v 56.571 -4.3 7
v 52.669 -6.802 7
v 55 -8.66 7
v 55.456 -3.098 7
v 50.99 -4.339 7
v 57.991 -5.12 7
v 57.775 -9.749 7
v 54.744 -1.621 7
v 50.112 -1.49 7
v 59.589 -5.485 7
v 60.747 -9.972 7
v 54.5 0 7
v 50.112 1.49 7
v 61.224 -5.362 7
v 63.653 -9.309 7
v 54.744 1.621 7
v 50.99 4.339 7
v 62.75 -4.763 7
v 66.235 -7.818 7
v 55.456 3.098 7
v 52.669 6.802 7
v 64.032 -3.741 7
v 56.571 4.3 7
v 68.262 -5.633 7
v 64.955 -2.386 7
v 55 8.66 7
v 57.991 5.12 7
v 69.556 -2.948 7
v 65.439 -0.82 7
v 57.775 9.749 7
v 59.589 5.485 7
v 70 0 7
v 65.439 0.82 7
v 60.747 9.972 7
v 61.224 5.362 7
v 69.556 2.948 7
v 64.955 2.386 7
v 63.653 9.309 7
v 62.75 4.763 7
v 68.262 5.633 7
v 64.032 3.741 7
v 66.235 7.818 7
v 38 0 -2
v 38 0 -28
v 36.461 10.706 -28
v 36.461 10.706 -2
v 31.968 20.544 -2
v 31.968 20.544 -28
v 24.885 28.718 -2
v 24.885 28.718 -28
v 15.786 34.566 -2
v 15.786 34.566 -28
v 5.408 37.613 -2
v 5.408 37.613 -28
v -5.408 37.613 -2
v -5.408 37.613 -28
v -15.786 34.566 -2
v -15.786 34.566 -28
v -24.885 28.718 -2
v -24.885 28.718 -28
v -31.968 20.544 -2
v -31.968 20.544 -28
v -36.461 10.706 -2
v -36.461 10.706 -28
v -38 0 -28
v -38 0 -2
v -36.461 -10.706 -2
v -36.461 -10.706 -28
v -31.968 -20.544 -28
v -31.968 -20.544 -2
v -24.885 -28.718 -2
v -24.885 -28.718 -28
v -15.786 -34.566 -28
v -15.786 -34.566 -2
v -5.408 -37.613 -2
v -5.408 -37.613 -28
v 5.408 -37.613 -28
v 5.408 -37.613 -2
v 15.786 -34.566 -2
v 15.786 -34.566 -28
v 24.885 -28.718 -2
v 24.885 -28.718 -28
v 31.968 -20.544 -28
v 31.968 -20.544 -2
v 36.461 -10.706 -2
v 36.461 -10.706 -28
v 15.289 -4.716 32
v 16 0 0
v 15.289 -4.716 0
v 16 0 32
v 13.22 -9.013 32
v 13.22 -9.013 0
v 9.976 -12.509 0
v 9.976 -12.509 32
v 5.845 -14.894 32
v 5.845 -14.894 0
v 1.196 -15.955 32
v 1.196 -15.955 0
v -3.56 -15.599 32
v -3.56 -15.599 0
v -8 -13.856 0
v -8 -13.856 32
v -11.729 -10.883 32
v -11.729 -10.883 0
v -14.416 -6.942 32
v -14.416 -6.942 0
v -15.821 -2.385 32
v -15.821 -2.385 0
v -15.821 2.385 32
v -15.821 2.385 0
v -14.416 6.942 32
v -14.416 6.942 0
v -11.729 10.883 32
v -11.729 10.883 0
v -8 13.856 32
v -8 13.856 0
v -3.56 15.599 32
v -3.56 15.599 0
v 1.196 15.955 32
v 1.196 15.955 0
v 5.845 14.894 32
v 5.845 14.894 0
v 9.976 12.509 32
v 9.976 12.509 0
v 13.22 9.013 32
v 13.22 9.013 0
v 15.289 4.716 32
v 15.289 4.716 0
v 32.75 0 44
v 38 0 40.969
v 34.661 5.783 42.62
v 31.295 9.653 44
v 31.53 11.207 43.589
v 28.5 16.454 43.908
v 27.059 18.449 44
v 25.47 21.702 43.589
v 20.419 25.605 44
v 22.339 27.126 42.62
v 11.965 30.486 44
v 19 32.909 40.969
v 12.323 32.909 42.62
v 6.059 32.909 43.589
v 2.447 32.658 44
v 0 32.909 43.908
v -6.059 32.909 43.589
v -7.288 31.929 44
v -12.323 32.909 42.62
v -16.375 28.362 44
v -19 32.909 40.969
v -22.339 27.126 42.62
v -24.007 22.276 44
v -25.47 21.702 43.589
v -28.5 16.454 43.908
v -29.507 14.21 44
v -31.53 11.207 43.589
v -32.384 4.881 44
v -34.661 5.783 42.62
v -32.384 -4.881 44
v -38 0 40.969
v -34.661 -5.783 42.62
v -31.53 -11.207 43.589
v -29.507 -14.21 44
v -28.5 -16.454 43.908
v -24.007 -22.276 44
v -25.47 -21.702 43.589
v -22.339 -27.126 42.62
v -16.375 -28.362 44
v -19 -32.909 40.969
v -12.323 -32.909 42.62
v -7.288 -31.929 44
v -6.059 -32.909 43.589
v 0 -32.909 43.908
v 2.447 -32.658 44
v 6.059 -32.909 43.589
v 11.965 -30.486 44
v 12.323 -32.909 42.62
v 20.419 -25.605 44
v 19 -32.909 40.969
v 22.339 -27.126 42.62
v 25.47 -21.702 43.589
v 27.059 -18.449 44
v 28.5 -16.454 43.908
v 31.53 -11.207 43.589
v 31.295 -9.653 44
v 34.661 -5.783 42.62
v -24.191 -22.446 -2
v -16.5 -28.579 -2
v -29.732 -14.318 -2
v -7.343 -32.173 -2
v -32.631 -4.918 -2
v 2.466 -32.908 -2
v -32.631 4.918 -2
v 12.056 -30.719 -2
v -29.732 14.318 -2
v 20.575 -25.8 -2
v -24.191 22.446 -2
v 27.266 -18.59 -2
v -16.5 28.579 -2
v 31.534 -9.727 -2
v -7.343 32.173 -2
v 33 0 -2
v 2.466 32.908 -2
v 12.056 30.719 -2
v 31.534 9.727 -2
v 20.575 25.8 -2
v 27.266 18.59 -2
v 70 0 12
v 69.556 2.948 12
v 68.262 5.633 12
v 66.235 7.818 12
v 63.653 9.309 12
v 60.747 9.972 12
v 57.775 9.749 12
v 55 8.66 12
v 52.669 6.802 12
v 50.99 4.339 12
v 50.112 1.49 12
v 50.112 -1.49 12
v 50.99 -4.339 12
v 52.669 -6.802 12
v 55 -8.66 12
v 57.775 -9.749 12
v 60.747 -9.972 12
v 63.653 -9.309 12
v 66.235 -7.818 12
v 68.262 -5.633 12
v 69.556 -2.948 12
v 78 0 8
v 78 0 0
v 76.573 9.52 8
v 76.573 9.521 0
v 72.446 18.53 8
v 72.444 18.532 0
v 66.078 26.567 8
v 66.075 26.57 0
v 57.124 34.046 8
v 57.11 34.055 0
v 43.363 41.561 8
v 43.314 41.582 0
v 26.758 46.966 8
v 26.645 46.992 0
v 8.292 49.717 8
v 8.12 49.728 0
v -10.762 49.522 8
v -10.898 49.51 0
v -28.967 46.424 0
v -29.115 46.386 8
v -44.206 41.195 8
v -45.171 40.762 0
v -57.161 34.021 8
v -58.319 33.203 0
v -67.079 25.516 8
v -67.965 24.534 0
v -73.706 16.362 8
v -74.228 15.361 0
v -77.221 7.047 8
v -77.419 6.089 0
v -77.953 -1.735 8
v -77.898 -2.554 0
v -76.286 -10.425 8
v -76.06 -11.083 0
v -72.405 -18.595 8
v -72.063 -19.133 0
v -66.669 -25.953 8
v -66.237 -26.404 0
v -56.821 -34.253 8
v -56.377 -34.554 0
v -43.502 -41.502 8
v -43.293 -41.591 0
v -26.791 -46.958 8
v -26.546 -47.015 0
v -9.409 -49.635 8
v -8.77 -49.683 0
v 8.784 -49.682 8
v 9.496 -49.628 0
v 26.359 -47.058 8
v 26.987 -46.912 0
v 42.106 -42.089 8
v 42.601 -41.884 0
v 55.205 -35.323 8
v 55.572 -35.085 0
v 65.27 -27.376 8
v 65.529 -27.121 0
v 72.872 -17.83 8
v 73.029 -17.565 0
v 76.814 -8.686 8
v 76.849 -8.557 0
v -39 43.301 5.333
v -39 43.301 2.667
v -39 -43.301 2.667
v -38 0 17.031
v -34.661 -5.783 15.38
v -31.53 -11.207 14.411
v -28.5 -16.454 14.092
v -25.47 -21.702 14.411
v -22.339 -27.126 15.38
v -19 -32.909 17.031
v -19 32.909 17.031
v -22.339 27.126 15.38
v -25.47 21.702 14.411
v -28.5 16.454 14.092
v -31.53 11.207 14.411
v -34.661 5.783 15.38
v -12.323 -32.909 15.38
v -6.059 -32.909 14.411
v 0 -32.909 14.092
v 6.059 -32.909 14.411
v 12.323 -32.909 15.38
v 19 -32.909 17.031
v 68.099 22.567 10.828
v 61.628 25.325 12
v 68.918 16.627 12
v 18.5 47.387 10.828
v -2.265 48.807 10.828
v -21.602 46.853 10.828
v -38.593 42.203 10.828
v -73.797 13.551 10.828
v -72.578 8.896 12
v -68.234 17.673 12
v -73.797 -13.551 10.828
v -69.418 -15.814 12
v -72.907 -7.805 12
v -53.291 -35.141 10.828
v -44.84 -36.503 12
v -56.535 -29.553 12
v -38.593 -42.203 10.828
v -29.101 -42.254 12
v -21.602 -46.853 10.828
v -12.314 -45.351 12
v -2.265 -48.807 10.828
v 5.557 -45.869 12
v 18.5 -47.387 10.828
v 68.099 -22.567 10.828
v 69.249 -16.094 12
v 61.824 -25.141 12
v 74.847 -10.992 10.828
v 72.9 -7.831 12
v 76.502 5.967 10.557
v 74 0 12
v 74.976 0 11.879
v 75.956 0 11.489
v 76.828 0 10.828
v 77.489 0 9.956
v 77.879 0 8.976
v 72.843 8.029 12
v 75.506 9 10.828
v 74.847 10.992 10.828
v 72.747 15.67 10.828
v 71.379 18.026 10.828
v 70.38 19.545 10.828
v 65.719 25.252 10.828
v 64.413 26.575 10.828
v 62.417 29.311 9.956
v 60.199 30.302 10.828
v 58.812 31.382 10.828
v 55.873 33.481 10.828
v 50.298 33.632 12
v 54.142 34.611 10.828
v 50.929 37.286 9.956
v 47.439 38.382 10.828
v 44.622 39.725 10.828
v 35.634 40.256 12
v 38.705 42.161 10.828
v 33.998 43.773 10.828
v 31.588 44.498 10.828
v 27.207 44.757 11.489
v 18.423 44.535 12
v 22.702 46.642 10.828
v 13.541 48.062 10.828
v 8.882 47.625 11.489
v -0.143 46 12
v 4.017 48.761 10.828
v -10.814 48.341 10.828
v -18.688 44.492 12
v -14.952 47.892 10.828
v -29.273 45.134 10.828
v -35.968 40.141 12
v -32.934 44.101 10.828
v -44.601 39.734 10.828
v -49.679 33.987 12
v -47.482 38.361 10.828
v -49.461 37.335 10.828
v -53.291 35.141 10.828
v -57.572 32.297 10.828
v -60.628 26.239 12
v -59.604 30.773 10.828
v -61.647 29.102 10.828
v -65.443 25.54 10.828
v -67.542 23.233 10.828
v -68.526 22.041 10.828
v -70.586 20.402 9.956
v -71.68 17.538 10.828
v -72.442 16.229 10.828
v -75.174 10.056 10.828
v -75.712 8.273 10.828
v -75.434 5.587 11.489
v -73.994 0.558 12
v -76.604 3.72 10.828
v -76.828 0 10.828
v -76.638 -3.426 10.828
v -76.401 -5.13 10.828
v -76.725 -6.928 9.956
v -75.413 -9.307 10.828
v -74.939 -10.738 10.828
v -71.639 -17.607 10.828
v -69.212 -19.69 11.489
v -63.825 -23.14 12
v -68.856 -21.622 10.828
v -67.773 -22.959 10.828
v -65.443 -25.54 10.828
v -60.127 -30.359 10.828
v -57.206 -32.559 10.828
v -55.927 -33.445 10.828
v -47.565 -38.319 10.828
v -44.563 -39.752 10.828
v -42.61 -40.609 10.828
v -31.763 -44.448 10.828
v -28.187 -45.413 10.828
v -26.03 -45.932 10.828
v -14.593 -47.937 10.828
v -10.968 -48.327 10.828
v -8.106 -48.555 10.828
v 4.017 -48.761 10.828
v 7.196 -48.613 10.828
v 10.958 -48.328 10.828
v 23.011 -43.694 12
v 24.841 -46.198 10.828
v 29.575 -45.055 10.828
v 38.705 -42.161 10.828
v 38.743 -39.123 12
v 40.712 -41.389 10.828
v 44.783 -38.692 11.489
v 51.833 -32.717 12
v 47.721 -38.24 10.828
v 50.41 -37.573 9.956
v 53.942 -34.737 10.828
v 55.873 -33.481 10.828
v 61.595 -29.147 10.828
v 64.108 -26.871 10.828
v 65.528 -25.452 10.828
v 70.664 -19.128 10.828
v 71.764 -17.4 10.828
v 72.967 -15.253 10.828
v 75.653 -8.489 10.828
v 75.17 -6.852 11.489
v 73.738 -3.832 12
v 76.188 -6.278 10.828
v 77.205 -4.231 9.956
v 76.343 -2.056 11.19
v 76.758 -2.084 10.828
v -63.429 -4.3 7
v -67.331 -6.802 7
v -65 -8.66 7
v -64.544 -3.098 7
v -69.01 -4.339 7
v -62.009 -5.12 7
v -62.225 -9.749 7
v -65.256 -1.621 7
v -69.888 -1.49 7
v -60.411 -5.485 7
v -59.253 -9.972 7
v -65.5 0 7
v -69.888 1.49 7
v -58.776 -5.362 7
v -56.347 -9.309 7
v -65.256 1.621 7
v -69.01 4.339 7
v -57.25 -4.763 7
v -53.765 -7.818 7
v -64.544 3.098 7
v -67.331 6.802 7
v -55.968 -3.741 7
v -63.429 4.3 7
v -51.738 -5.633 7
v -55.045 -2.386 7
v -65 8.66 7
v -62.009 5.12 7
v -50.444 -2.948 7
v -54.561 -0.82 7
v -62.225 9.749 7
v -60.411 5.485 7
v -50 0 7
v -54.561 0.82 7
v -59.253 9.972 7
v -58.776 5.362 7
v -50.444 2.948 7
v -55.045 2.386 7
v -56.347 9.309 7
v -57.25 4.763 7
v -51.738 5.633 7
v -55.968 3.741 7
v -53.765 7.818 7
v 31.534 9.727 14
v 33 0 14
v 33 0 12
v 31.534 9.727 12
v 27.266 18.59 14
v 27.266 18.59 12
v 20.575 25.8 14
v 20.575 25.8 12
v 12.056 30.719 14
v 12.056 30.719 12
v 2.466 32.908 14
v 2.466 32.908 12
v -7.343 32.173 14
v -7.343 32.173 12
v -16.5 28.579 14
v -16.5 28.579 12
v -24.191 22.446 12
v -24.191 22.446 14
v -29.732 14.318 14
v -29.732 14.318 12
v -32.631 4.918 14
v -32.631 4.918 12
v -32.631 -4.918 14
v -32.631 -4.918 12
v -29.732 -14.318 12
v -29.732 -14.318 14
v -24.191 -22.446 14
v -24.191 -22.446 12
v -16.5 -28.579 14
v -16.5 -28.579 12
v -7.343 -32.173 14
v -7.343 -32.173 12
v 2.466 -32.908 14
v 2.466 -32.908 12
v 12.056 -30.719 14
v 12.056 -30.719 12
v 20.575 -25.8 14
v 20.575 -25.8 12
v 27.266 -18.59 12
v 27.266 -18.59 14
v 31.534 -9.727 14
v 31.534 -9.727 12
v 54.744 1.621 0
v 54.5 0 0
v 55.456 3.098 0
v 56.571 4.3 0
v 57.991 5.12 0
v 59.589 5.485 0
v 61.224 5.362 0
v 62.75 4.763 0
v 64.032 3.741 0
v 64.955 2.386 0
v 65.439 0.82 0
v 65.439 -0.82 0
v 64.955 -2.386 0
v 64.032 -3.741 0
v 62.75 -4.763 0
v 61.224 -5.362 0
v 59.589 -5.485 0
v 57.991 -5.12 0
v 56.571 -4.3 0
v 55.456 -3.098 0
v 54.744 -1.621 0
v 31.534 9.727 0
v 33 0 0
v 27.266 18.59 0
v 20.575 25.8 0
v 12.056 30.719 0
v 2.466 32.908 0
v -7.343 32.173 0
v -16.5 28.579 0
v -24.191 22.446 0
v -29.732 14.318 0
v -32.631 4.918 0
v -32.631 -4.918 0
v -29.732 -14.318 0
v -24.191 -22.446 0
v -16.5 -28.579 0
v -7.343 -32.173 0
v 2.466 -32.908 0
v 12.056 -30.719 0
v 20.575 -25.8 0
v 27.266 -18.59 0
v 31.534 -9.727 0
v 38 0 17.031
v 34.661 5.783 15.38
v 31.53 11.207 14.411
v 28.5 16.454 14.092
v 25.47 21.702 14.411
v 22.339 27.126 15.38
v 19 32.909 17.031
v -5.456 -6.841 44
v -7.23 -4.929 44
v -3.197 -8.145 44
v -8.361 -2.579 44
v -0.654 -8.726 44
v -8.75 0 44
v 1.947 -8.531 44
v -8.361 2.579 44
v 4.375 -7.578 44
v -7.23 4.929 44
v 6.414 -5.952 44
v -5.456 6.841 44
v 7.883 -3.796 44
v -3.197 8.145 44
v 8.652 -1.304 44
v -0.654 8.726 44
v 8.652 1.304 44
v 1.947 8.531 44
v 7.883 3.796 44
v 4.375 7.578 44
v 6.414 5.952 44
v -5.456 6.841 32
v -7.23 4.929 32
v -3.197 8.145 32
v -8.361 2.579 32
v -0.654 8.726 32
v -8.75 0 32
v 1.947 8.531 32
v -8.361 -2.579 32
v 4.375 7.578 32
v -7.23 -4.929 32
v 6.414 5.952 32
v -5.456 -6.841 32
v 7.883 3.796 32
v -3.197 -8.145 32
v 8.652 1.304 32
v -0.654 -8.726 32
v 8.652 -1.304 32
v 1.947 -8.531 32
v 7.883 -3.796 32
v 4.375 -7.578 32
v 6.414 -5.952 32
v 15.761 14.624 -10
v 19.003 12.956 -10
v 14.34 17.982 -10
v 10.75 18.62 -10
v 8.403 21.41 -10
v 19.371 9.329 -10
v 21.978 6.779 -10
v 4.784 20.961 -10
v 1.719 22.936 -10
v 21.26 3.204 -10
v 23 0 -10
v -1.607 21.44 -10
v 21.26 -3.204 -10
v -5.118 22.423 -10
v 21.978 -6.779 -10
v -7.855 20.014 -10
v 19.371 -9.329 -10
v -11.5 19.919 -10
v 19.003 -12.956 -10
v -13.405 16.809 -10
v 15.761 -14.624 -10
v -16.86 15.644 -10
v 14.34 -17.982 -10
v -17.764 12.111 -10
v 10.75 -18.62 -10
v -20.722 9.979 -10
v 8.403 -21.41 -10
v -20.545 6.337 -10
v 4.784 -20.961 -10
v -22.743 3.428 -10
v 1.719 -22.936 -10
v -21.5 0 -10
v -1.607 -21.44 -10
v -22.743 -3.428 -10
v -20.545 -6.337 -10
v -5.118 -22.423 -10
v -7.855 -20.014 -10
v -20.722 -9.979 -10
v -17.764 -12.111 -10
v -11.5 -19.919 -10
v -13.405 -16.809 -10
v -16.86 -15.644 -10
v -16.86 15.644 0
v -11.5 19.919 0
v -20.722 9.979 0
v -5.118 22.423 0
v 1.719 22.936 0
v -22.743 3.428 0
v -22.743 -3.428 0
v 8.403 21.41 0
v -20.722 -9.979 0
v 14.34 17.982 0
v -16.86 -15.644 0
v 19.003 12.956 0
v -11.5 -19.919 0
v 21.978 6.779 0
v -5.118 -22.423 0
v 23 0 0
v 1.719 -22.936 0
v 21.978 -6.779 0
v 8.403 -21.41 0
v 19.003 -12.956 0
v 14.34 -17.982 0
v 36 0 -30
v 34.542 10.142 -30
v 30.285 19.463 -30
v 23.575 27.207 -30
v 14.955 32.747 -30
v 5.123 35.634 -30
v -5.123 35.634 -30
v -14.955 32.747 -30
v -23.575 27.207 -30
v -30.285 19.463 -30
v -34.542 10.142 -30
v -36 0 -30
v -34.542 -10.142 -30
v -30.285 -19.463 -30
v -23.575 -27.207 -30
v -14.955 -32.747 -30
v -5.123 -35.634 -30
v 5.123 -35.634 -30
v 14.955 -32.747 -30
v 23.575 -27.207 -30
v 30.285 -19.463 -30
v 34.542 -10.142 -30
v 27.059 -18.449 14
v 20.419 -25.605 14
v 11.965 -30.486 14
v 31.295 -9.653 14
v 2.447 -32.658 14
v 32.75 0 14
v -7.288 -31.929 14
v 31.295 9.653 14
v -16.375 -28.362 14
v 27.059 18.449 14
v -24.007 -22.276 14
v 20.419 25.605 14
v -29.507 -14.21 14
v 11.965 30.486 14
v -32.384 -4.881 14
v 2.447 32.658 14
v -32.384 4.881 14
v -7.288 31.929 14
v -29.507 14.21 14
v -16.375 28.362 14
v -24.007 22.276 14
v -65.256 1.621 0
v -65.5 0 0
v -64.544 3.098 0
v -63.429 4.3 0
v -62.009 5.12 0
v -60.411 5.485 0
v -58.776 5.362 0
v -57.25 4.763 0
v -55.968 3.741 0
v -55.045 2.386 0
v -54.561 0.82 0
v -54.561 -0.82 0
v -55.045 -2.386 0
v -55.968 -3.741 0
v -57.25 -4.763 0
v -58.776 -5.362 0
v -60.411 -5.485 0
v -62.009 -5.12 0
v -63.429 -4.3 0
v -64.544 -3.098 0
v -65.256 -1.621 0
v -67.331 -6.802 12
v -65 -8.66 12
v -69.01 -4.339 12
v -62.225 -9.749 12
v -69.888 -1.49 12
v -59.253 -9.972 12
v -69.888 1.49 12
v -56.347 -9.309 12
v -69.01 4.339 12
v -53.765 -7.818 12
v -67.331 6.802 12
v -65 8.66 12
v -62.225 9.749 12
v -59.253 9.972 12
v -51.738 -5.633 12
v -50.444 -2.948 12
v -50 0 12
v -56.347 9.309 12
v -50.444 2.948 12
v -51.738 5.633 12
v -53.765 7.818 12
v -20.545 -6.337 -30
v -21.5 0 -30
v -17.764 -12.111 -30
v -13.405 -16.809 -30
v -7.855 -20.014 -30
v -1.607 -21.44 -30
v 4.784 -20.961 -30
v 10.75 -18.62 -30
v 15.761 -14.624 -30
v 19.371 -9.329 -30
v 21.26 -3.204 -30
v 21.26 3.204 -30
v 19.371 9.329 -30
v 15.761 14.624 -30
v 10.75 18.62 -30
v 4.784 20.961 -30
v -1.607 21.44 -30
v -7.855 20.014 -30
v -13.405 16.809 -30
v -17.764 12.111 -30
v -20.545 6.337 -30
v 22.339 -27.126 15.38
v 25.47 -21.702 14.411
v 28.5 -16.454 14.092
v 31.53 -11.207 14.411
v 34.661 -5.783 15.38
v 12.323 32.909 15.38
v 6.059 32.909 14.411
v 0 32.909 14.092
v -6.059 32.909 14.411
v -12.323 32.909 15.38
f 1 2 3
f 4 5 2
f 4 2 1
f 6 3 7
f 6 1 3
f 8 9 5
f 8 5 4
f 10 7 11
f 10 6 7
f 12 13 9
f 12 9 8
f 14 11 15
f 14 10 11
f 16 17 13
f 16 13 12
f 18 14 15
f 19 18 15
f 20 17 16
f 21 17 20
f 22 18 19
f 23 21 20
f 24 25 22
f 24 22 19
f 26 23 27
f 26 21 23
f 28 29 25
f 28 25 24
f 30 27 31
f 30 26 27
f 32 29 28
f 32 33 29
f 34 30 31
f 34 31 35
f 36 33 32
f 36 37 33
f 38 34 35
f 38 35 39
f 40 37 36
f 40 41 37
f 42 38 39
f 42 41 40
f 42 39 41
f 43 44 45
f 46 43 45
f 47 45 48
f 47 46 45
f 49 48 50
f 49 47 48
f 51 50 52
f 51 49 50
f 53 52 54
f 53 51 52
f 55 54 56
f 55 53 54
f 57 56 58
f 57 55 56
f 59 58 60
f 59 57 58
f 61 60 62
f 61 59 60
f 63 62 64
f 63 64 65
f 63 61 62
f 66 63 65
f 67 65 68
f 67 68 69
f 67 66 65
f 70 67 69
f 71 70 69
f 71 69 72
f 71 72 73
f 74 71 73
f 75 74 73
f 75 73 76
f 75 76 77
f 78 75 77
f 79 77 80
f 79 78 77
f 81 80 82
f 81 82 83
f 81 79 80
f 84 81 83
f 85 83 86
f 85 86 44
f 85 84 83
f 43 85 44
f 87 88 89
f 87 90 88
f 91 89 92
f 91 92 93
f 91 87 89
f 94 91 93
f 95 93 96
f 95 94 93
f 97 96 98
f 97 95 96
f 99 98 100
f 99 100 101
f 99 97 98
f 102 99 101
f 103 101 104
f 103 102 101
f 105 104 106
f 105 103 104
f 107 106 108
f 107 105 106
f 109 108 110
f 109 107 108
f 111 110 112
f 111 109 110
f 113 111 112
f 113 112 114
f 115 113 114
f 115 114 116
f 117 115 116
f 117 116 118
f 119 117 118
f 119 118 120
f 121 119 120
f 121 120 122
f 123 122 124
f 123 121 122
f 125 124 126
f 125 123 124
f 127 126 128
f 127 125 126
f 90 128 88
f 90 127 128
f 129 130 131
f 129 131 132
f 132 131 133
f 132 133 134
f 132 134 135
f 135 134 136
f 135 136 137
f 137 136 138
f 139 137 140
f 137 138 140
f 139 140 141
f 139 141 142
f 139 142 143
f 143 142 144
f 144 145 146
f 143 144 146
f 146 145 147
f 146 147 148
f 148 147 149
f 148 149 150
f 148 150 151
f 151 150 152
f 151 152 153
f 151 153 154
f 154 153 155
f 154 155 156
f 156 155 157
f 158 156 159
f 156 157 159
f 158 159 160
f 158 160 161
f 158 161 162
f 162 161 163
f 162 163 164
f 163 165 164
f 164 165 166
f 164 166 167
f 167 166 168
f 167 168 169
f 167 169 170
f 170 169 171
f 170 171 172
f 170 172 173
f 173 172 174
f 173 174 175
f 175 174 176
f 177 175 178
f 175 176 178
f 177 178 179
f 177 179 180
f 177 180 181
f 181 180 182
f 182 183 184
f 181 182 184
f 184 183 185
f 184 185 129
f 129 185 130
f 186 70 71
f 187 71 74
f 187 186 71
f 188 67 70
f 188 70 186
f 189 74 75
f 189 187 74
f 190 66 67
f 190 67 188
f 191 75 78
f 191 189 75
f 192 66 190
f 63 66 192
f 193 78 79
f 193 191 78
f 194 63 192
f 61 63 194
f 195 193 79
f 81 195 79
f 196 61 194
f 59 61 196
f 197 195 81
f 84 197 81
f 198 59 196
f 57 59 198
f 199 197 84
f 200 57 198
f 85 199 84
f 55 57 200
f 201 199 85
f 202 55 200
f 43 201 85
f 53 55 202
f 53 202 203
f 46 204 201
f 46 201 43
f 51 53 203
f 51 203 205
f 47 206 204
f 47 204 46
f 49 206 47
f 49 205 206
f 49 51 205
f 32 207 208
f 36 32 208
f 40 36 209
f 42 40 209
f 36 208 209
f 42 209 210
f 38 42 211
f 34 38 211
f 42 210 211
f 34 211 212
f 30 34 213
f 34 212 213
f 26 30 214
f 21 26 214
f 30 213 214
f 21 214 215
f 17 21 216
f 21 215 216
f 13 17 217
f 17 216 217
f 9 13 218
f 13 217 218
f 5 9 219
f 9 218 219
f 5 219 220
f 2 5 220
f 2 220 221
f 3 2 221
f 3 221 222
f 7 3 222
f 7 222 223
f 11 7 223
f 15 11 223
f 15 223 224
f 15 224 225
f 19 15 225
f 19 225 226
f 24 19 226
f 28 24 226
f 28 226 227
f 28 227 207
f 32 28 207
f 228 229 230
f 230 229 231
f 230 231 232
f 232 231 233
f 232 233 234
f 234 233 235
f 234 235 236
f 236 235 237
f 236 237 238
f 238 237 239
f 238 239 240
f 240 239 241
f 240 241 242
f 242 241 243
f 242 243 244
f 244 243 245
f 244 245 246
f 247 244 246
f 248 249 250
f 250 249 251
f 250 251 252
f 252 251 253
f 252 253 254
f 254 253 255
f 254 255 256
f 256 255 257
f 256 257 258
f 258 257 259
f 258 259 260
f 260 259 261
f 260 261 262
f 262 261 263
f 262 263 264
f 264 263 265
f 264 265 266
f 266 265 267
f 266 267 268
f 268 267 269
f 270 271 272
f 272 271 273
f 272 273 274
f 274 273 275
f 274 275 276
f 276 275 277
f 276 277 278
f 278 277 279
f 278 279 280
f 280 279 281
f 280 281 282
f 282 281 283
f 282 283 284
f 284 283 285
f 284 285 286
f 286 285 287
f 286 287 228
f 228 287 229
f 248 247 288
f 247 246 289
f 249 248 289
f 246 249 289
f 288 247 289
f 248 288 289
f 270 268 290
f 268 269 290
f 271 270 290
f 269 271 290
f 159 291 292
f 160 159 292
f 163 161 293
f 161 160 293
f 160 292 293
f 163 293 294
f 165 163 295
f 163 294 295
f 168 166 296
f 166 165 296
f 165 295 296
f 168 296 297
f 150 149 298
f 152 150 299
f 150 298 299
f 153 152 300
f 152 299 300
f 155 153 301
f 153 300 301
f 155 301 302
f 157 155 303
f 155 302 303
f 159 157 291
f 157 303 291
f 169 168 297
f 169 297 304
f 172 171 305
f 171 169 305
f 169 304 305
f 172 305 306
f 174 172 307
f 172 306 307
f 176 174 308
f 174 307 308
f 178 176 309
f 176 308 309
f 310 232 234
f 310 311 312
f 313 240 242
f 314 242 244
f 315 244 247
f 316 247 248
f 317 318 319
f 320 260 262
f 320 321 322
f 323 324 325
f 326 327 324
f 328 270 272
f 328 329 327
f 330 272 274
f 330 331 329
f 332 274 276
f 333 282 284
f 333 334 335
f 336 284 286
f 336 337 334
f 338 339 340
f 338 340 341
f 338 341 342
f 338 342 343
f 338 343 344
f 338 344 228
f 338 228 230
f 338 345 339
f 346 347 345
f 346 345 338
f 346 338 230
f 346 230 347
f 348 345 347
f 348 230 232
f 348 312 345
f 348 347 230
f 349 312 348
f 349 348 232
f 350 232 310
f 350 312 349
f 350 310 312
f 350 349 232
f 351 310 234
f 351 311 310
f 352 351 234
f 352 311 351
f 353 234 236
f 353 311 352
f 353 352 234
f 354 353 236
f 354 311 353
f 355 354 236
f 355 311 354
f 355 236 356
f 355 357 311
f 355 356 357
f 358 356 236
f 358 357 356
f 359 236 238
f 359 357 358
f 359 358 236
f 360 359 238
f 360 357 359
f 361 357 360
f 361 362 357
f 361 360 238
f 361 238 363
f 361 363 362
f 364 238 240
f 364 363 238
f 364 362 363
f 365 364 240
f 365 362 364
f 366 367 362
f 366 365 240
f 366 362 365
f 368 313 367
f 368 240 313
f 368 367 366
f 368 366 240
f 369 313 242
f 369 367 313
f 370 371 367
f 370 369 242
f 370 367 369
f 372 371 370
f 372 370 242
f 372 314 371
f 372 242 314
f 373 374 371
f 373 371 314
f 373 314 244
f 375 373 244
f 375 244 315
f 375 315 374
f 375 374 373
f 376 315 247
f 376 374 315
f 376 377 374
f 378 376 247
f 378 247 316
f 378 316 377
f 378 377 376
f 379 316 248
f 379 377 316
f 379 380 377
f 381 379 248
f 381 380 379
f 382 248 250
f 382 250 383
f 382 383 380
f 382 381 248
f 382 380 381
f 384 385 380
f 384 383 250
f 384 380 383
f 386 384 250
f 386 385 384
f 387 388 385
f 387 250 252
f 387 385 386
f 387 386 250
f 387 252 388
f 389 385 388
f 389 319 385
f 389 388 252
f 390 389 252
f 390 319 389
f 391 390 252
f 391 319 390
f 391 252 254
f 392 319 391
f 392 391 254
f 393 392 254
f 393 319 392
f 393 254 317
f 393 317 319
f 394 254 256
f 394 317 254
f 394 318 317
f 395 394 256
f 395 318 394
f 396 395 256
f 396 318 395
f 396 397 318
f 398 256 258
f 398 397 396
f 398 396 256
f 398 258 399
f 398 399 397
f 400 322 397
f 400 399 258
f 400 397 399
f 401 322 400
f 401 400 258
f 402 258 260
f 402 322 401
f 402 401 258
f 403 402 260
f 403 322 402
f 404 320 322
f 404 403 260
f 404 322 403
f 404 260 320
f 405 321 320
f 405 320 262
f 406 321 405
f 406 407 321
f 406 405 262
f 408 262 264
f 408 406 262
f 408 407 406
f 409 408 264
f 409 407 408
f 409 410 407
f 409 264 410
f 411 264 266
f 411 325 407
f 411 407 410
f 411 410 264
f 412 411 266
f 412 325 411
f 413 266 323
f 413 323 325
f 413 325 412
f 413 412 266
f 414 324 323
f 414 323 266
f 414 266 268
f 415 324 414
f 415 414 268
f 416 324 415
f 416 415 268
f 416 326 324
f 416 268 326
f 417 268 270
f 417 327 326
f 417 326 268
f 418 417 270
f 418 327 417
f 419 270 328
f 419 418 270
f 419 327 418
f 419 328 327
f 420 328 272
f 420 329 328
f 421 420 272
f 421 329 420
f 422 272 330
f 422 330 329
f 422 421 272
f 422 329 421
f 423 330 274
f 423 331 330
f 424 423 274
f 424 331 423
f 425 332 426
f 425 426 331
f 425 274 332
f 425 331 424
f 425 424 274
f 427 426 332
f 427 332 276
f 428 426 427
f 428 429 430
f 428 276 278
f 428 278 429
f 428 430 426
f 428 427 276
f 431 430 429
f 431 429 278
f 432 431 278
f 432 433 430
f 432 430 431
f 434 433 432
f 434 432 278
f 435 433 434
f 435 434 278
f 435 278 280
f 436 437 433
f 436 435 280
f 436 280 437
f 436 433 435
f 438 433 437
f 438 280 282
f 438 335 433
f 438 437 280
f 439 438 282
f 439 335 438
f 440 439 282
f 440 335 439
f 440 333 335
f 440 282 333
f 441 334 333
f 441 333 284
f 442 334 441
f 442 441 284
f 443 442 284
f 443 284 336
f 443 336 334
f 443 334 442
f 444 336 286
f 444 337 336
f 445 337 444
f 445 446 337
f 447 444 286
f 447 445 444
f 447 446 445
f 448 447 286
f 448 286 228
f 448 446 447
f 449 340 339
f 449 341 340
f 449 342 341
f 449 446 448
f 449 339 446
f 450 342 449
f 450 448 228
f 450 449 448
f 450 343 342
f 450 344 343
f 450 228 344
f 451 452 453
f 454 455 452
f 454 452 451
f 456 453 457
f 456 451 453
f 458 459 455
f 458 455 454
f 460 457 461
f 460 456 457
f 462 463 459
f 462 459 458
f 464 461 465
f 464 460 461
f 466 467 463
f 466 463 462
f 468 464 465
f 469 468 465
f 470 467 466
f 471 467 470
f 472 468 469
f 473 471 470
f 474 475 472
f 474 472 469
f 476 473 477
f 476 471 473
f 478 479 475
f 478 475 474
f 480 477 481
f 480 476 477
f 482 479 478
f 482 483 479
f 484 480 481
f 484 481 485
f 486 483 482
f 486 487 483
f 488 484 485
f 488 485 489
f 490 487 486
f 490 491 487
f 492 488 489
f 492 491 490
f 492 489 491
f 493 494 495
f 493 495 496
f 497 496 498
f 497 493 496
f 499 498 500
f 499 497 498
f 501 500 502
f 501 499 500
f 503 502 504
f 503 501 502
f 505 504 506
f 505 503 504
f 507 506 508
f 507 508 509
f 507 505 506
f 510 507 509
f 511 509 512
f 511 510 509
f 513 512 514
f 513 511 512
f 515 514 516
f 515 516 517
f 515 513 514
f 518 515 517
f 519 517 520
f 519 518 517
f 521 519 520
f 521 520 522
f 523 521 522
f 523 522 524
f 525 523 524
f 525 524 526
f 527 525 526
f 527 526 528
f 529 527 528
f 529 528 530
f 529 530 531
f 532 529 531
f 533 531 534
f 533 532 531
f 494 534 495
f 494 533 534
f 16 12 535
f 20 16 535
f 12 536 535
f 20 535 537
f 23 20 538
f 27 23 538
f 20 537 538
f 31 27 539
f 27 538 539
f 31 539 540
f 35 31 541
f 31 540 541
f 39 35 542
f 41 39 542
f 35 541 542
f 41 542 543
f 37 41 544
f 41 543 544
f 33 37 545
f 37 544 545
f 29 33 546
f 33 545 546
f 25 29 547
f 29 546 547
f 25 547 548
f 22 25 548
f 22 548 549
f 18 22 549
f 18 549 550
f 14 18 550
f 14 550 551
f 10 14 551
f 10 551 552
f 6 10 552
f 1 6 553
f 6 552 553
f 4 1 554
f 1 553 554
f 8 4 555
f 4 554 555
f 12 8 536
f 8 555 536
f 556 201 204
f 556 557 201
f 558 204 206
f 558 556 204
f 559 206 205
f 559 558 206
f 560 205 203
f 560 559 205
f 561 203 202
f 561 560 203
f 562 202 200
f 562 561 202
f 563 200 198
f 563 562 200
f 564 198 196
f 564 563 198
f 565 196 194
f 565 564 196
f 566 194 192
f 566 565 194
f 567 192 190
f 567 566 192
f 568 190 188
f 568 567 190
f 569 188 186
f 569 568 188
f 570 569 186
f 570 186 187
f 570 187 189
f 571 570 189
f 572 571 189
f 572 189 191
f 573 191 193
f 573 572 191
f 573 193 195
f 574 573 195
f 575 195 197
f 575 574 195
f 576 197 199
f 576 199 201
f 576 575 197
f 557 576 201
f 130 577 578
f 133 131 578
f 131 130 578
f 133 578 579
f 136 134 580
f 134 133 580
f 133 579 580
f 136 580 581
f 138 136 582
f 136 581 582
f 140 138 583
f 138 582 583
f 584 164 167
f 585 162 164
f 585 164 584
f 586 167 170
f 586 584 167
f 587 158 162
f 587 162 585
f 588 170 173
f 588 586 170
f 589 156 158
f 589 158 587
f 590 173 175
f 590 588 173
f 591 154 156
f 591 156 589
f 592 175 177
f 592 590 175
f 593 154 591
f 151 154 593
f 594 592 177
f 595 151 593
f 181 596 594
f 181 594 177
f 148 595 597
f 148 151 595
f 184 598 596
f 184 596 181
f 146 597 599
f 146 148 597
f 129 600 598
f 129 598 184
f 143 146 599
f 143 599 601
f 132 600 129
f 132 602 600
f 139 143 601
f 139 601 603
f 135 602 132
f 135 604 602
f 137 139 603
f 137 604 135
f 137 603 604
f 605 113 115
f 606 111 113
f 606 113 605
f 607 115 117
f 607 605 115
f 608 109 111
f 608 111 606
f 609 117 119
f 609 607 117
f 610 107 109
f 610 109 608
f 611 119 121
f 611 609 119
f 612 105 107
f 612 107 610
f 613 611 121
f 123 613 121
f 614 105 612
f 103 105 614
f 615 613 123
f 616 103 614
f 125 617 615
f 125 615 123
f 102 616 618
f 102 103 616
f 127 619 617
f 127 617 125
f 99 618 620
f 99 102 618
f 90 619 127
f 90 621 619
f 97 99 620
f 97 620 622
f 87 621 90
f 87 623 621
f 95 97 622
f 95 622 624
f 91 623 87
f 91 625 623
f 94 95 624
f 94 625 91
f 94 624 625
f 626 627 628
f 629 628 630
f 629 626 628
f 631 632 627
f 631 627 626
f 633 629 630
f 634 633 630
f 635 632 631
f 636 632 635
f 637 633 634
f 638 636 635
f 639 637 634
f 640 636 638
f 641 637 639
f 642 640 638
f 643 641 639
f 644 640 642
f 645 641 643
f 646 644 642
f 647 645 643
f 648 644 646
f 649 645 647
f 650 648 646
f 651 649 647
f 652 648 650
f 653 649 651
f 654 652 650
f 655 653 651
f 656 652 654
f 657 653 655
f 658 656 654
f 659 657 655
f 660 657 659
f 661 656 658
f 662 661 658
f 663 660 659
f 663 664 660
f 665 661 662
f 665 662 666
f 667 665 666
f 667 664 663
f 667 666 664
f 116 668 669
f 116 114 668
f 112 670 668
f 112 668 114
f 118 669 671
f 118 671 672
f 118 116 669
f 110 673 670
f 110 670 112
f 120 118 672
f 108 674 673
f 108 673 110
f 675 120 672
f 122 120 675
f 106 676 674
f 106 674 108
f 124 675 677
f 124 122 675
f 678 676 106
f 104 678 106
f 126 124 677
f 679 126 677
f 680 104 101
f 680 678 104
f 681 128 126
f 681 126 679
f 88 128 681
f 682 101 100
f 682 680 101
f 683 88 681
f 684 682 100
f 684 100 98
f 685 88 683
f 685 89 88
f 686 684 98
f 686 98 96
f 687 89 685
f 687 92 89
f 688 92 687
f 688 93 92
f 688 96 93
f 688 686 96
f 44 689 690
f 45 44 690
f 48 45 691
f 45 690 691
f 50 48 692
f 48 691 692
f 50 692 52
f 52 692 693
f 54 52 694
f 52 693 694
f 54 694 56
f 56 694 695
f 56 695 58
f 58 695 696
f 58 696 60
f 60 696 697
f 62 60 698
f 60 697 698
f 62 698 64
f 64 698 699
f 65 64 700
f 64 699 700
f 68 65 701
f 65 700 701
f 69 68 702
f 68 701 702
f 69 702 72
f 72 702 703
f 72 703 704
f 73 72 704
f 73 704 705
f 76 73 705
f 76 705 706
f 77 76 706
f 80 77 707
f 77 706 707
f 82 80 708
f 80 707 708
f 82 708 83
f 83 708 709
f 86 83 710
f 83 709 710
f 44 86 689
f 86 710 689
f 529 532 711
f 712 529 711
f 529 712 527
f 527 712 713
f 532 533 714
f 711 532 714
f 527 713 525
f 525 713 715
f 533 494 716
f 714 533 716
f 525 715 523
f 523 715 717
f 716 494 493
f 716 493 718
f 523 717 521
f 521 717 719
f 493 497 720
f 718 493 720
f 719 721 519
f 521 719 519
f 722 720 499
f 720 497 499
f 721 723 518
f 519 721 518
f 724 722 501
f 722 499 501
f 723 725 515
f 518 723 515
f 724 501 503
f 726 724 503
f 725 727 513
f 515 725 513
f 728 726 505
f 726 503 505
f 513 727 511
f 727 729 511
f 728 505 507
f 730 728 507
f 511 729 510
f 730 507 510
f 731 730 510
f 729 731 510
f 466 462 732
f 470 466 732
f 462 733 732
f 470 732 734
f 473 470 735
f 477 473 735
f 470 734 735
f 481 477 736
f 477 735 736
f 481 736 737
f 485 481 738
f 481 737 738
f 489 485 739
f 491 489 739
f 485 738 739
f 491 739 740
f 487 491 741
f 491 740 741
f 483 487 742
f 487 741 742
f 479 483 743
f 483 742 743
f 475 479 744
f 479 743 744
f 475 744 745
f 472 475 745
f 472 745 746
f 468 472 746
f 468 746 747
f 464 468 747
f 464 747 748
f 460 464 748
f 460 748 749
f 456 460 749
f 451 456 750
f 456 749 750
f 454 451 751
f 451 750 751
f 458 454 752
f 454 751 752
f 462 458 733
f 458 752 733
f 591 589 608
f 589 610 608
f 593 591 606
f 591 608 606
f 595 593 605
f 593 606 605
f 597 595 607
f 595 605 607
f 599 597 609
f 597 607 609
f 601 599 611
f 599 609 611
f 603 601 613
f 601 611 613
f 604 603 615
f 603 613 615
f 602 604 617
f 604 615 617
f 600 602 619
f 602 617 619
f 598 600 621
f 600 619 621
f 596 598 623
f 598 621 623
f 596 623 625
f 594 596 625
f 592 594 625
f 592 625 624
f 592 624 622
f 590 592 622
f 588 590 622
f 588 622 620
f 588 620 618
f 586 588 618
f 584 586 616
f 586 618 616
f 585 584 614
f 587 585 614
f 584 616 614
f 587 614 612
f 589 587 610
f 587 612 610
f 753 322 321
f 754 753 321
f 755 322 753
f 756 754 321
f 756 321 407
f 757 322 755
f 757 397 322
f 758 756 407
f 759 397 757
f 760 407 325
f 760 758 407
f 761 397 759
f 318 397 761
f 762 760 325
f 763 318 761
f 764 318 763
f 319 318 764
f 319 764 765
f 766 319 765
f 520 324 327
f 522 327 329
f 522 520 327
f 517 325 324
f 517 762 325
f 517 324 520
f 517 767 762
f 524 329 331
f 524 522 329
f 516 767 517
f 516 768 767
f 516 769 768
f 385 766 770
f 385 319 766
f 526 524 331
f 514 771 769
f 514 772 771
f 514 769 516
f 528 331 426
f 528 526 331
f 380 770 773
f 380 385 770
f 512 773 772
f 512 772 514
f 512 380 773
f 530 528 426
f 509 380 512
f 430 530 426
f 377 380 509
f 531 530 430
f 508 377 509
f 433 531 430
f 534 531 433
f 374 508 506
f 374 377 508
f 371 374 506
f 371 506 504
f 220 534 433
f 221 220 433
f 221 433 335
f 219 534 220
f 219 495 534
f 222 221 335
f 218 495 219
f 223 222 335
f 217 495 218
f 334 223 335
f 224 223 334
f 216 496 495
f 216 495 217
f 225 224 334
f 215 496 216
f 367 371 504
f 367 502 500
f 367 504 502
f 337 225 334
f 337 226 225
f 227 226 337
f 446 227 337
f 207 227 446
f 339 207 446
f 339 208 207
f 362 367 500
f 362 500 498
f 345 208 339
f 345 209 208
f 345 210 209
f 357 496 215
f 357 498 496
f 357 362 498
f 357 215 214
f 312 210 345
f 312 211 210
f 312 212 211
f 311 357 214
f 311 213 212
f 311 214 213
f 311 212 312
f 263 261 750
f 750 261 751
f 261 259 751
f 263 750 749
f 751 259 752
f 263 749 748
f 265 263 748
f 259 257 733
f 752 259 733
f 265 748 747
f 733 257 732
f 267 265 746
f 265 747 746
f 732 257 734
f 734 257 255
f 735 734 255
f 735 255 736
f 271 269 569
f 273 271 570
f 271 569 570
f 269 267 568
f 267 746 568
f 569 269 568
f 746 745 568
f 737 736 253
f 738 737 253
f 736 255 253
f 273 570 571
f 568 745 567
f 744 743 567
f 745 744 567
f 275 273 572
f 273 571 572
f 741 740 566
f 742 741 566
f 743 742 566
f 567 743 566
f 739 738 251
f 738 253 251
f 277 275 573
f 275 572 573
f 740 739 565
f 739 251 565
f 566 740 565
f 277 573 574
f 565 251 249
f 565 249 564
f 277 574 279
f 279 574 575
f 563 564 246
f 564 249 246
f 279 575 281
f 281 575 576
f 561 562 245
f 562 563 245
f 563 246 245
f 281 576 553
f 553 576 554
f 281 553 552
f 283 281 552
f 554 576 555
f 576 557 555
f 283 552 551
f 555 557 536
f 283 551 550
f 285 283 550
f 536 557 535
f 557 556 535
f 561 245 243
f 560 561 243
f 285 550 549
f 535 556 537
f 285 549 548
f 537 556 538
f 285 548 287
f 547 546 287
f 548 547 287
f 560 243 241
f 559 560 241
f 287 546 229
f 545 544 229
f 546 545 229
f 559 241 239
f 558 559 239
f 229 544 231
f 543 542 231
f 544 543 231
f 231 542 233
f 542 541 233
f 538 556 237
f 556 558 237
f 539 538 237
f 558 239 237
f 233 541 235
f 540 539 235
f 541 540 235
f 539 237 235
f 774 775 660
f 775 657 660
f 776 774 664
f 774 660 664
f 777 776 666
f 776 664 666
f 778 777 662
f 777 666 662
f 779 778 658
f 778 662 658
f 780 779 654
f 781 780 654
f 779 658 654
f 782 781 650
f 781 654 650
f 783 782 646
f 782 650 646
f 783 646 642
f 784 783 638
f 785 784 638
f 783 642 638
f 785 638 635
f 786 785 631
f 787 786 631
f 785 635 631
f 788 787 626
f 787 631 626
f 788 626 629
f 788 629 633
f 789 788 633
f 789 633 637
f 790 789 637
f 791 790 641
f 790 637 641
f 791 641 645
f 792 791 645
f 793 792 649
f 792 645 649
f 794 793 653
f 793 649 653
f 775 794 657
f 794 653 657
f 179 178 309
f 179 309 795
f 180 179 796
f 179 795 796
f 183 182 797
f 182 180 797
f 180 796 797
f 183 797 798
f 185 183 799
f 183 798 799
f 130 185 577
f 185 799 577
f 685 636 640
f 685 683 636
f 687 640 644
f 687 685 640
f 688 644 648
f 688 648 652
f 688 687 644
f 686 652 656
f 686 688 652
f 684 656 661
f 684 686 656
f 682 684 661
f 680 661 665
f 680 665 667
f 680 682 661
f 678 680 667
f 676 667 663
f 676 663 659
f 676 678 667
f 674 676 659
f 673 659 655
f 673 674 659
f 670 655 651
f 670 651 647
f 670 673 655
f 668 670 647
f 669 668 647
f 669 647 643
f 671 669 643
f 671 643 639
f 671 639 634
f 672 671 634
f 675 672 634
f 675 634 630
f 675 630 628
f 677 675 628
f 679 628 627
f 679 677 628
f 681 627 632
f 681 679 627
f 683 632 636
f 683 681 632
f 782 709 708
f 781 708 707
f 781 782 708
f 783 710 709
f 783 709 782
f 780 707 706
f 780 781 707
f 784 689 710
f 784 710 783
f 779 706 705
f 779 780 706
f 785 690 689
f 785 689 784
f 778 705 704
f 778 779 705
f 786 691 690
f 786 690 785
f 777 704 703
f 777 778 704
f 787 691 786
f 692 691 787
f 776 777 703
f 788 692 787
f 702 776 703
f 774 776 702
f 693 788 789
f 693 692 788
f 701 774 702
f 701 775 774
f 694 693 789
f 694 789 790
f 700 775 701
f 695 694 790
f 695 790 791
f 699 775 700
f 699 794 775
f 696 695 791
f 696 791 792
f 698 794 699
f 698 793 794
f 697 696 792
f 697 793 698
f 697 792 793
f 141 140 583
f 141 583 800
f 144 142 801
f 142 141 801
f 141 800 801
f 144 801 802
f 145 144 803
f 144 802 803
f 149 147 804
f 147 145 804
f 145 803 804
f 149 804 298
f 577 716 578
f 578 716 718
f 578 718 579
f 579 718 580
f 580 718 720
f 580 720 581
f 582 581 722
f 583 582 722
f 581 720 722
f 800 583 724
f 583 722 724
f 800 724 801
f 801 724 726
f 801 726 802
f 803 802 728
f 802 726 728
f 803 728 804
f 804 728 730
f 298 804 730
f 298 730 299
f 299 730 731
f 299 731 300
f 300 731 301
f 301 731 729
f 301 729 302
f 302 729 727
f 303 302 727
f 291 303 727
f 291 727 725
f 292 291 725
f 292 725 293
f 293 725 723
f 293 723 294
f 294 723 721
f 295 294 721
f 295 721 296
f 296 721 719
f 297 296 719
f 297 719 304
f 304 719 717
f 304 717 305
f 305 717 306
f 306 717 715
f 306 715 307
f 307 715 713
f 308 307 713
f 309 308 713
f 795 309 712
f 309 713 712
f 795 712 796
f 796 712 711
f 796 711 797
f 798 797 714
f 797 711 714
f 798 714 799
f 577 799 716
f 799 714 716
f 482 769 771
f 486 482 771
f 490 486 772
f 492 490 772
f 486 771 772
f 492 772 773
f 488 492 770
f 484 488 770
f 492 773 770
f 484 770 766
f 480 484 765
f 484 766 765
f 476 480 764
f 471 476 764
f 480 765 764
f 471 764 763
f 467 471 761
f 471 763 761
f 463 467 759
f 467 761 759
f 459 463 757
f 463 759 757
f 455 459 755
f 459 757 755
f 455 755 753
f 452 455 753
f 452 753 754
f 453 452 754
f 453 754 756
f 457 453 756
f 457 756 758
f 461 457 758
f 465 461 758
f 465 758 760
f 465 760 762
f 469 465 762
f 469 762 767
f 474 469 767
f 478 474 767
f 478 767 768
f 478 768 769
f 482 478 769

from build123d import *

# Parameters (mm, degrees)
F1_DEPTH       = 12
F2_W           = 33
F2_H           = 2
F5_DEPTH       = 30
F7_D           = 11
F7_CBORE_D     = 20
F7_CBORE_DEPTH = 5
F11_D          = 17.5
F11_DEPTH      = 12
F11_TIP        = 5.2575304165
F13_D          = 43
F13_DEPTH      = 20
F13_TIP        = 12.9185033091
F14_R          = 4
F15_SIZE2      = 2
F15_SIZE       = 2


with BuildPart() as f1:
    # F0 (on Top) → F1 (new body)
    with BuildSketch(Plane.XY):
        with BuildLine():
            add(Edge.make_bspline(
                [(78, 0), (78, 86.6025403784), (-39, 43.3012701892), (-156, 0), (-39, -43.3012701892), (78, -86.6025403784), (78, 0)],
                knots=[0, 0, 0, 2.0943951024, 2.0943951024, 4.1887902048, 4.1887902048, 6.2831853072, 6.2831853072, 6.2831853072], degree=2, weights=[1, 0.5, 1, 0.5, 1, 0.5, 1]))
        make_face()
    extrude(amount=F1_DEPTH)

    # F2 (on Front) → F3 (revolve)
    with BuildSketch(Plane.XZ):
        Polygon((0, 0), (0, -30), (38, -30), (38, -2), (33, -2), (33, 0), align=None)
        with Locations((16.5, 13)):
            Rectangle(F2_W, F2_H)
    revolve(axis=Axis((0, 0, 46.2898081845), (0, 0, 1)))

    # F4 (on face) → F5 (join)
    with BuildSketch(Plane.XY.offset(14)):
        Polygon((38, 0), (19, 32.9089653438), (-19, 32.9089653438), (-38, 0), (-19, -32.9089653438), (19, -32.9089653438), align=None)
    extrude(amount=F5_DEPTH)

    # F7 (through all)
    with Locations(Plane.XY.offset(12)):
        with Locations((-60, 0), (60, 0)):
            CounterBoreHole(F7_D / 2, F7_CBORE_D / 2, F7_CBORE_DEPTH)

    # F8 (on Front) → F9 (revolve, cut)
    with BuildSketch(Plane.XZ):
        Polygon((16, 32), (0, 32), (0, -10), (23, -10), (23, 0), (16, 0), align=None)
    revolve(axis=Axis((0, 0, 27.1871145815), (0, 0, -1)), mode=Mode.SUBTRACT)

    # F11
    with Locations(Plane.XY.offset(44)):
        with Locations((0, 0)):
            Hole(F11_D / 2, depth=F11_DEPTH)
            with Locations((0, 0, -(F11_DEPTH + F11_TIP / 2))):  # 118° drill point
                Cone(0, F11_D / 2, F11_TIP, mode=Mode.SUBTRACT)

    # F13
    with Locations(Plane(origin=(0, 0, -30), x_dir=(1, 0, 0), z_dir=(0, 0, -1))):
        with Locations((0, 0)):
            Hole(F13_D / 2, depth=F13_DEPTH)
            with Locations((0, 0, -(F13_DEPTH + F13_TIP / 2))):  # 118° drill point
                Cone(0, F13_D / 2, F13_TIP, mode=Mode.SUBTRACT)

    # F14
    f14_edges = [f1.edges().sort_by_distance(p)[0] for p in [
        (-78, 0, 12),
    ]]
    fillet(f14_edges, radius=F14_R)

    # F15
    f15_edges = [f1.edges().sort_by_distance(p)[0] for p in [
        (-38, 0, -30),
    ]]
    chamfer(f15_edges, length=F15_SIZE, length2=F15_SIZE2)

    # F16 (on Front) → F17 (revolve, cut)
    with BuildSketch(Plane.XZ):
        Polygon((38, 44), (32.75, 44), (38, 40.9689110868), align=None)
        Polygon((38, 17.0310889132), (32.75, 14), (38, 14), align=None)
    revolve(axis=Axis((0, 0, 17.0408003032), (0, 0, 1)), mode=Mode.SUBTRACT)


solid = f1.part
